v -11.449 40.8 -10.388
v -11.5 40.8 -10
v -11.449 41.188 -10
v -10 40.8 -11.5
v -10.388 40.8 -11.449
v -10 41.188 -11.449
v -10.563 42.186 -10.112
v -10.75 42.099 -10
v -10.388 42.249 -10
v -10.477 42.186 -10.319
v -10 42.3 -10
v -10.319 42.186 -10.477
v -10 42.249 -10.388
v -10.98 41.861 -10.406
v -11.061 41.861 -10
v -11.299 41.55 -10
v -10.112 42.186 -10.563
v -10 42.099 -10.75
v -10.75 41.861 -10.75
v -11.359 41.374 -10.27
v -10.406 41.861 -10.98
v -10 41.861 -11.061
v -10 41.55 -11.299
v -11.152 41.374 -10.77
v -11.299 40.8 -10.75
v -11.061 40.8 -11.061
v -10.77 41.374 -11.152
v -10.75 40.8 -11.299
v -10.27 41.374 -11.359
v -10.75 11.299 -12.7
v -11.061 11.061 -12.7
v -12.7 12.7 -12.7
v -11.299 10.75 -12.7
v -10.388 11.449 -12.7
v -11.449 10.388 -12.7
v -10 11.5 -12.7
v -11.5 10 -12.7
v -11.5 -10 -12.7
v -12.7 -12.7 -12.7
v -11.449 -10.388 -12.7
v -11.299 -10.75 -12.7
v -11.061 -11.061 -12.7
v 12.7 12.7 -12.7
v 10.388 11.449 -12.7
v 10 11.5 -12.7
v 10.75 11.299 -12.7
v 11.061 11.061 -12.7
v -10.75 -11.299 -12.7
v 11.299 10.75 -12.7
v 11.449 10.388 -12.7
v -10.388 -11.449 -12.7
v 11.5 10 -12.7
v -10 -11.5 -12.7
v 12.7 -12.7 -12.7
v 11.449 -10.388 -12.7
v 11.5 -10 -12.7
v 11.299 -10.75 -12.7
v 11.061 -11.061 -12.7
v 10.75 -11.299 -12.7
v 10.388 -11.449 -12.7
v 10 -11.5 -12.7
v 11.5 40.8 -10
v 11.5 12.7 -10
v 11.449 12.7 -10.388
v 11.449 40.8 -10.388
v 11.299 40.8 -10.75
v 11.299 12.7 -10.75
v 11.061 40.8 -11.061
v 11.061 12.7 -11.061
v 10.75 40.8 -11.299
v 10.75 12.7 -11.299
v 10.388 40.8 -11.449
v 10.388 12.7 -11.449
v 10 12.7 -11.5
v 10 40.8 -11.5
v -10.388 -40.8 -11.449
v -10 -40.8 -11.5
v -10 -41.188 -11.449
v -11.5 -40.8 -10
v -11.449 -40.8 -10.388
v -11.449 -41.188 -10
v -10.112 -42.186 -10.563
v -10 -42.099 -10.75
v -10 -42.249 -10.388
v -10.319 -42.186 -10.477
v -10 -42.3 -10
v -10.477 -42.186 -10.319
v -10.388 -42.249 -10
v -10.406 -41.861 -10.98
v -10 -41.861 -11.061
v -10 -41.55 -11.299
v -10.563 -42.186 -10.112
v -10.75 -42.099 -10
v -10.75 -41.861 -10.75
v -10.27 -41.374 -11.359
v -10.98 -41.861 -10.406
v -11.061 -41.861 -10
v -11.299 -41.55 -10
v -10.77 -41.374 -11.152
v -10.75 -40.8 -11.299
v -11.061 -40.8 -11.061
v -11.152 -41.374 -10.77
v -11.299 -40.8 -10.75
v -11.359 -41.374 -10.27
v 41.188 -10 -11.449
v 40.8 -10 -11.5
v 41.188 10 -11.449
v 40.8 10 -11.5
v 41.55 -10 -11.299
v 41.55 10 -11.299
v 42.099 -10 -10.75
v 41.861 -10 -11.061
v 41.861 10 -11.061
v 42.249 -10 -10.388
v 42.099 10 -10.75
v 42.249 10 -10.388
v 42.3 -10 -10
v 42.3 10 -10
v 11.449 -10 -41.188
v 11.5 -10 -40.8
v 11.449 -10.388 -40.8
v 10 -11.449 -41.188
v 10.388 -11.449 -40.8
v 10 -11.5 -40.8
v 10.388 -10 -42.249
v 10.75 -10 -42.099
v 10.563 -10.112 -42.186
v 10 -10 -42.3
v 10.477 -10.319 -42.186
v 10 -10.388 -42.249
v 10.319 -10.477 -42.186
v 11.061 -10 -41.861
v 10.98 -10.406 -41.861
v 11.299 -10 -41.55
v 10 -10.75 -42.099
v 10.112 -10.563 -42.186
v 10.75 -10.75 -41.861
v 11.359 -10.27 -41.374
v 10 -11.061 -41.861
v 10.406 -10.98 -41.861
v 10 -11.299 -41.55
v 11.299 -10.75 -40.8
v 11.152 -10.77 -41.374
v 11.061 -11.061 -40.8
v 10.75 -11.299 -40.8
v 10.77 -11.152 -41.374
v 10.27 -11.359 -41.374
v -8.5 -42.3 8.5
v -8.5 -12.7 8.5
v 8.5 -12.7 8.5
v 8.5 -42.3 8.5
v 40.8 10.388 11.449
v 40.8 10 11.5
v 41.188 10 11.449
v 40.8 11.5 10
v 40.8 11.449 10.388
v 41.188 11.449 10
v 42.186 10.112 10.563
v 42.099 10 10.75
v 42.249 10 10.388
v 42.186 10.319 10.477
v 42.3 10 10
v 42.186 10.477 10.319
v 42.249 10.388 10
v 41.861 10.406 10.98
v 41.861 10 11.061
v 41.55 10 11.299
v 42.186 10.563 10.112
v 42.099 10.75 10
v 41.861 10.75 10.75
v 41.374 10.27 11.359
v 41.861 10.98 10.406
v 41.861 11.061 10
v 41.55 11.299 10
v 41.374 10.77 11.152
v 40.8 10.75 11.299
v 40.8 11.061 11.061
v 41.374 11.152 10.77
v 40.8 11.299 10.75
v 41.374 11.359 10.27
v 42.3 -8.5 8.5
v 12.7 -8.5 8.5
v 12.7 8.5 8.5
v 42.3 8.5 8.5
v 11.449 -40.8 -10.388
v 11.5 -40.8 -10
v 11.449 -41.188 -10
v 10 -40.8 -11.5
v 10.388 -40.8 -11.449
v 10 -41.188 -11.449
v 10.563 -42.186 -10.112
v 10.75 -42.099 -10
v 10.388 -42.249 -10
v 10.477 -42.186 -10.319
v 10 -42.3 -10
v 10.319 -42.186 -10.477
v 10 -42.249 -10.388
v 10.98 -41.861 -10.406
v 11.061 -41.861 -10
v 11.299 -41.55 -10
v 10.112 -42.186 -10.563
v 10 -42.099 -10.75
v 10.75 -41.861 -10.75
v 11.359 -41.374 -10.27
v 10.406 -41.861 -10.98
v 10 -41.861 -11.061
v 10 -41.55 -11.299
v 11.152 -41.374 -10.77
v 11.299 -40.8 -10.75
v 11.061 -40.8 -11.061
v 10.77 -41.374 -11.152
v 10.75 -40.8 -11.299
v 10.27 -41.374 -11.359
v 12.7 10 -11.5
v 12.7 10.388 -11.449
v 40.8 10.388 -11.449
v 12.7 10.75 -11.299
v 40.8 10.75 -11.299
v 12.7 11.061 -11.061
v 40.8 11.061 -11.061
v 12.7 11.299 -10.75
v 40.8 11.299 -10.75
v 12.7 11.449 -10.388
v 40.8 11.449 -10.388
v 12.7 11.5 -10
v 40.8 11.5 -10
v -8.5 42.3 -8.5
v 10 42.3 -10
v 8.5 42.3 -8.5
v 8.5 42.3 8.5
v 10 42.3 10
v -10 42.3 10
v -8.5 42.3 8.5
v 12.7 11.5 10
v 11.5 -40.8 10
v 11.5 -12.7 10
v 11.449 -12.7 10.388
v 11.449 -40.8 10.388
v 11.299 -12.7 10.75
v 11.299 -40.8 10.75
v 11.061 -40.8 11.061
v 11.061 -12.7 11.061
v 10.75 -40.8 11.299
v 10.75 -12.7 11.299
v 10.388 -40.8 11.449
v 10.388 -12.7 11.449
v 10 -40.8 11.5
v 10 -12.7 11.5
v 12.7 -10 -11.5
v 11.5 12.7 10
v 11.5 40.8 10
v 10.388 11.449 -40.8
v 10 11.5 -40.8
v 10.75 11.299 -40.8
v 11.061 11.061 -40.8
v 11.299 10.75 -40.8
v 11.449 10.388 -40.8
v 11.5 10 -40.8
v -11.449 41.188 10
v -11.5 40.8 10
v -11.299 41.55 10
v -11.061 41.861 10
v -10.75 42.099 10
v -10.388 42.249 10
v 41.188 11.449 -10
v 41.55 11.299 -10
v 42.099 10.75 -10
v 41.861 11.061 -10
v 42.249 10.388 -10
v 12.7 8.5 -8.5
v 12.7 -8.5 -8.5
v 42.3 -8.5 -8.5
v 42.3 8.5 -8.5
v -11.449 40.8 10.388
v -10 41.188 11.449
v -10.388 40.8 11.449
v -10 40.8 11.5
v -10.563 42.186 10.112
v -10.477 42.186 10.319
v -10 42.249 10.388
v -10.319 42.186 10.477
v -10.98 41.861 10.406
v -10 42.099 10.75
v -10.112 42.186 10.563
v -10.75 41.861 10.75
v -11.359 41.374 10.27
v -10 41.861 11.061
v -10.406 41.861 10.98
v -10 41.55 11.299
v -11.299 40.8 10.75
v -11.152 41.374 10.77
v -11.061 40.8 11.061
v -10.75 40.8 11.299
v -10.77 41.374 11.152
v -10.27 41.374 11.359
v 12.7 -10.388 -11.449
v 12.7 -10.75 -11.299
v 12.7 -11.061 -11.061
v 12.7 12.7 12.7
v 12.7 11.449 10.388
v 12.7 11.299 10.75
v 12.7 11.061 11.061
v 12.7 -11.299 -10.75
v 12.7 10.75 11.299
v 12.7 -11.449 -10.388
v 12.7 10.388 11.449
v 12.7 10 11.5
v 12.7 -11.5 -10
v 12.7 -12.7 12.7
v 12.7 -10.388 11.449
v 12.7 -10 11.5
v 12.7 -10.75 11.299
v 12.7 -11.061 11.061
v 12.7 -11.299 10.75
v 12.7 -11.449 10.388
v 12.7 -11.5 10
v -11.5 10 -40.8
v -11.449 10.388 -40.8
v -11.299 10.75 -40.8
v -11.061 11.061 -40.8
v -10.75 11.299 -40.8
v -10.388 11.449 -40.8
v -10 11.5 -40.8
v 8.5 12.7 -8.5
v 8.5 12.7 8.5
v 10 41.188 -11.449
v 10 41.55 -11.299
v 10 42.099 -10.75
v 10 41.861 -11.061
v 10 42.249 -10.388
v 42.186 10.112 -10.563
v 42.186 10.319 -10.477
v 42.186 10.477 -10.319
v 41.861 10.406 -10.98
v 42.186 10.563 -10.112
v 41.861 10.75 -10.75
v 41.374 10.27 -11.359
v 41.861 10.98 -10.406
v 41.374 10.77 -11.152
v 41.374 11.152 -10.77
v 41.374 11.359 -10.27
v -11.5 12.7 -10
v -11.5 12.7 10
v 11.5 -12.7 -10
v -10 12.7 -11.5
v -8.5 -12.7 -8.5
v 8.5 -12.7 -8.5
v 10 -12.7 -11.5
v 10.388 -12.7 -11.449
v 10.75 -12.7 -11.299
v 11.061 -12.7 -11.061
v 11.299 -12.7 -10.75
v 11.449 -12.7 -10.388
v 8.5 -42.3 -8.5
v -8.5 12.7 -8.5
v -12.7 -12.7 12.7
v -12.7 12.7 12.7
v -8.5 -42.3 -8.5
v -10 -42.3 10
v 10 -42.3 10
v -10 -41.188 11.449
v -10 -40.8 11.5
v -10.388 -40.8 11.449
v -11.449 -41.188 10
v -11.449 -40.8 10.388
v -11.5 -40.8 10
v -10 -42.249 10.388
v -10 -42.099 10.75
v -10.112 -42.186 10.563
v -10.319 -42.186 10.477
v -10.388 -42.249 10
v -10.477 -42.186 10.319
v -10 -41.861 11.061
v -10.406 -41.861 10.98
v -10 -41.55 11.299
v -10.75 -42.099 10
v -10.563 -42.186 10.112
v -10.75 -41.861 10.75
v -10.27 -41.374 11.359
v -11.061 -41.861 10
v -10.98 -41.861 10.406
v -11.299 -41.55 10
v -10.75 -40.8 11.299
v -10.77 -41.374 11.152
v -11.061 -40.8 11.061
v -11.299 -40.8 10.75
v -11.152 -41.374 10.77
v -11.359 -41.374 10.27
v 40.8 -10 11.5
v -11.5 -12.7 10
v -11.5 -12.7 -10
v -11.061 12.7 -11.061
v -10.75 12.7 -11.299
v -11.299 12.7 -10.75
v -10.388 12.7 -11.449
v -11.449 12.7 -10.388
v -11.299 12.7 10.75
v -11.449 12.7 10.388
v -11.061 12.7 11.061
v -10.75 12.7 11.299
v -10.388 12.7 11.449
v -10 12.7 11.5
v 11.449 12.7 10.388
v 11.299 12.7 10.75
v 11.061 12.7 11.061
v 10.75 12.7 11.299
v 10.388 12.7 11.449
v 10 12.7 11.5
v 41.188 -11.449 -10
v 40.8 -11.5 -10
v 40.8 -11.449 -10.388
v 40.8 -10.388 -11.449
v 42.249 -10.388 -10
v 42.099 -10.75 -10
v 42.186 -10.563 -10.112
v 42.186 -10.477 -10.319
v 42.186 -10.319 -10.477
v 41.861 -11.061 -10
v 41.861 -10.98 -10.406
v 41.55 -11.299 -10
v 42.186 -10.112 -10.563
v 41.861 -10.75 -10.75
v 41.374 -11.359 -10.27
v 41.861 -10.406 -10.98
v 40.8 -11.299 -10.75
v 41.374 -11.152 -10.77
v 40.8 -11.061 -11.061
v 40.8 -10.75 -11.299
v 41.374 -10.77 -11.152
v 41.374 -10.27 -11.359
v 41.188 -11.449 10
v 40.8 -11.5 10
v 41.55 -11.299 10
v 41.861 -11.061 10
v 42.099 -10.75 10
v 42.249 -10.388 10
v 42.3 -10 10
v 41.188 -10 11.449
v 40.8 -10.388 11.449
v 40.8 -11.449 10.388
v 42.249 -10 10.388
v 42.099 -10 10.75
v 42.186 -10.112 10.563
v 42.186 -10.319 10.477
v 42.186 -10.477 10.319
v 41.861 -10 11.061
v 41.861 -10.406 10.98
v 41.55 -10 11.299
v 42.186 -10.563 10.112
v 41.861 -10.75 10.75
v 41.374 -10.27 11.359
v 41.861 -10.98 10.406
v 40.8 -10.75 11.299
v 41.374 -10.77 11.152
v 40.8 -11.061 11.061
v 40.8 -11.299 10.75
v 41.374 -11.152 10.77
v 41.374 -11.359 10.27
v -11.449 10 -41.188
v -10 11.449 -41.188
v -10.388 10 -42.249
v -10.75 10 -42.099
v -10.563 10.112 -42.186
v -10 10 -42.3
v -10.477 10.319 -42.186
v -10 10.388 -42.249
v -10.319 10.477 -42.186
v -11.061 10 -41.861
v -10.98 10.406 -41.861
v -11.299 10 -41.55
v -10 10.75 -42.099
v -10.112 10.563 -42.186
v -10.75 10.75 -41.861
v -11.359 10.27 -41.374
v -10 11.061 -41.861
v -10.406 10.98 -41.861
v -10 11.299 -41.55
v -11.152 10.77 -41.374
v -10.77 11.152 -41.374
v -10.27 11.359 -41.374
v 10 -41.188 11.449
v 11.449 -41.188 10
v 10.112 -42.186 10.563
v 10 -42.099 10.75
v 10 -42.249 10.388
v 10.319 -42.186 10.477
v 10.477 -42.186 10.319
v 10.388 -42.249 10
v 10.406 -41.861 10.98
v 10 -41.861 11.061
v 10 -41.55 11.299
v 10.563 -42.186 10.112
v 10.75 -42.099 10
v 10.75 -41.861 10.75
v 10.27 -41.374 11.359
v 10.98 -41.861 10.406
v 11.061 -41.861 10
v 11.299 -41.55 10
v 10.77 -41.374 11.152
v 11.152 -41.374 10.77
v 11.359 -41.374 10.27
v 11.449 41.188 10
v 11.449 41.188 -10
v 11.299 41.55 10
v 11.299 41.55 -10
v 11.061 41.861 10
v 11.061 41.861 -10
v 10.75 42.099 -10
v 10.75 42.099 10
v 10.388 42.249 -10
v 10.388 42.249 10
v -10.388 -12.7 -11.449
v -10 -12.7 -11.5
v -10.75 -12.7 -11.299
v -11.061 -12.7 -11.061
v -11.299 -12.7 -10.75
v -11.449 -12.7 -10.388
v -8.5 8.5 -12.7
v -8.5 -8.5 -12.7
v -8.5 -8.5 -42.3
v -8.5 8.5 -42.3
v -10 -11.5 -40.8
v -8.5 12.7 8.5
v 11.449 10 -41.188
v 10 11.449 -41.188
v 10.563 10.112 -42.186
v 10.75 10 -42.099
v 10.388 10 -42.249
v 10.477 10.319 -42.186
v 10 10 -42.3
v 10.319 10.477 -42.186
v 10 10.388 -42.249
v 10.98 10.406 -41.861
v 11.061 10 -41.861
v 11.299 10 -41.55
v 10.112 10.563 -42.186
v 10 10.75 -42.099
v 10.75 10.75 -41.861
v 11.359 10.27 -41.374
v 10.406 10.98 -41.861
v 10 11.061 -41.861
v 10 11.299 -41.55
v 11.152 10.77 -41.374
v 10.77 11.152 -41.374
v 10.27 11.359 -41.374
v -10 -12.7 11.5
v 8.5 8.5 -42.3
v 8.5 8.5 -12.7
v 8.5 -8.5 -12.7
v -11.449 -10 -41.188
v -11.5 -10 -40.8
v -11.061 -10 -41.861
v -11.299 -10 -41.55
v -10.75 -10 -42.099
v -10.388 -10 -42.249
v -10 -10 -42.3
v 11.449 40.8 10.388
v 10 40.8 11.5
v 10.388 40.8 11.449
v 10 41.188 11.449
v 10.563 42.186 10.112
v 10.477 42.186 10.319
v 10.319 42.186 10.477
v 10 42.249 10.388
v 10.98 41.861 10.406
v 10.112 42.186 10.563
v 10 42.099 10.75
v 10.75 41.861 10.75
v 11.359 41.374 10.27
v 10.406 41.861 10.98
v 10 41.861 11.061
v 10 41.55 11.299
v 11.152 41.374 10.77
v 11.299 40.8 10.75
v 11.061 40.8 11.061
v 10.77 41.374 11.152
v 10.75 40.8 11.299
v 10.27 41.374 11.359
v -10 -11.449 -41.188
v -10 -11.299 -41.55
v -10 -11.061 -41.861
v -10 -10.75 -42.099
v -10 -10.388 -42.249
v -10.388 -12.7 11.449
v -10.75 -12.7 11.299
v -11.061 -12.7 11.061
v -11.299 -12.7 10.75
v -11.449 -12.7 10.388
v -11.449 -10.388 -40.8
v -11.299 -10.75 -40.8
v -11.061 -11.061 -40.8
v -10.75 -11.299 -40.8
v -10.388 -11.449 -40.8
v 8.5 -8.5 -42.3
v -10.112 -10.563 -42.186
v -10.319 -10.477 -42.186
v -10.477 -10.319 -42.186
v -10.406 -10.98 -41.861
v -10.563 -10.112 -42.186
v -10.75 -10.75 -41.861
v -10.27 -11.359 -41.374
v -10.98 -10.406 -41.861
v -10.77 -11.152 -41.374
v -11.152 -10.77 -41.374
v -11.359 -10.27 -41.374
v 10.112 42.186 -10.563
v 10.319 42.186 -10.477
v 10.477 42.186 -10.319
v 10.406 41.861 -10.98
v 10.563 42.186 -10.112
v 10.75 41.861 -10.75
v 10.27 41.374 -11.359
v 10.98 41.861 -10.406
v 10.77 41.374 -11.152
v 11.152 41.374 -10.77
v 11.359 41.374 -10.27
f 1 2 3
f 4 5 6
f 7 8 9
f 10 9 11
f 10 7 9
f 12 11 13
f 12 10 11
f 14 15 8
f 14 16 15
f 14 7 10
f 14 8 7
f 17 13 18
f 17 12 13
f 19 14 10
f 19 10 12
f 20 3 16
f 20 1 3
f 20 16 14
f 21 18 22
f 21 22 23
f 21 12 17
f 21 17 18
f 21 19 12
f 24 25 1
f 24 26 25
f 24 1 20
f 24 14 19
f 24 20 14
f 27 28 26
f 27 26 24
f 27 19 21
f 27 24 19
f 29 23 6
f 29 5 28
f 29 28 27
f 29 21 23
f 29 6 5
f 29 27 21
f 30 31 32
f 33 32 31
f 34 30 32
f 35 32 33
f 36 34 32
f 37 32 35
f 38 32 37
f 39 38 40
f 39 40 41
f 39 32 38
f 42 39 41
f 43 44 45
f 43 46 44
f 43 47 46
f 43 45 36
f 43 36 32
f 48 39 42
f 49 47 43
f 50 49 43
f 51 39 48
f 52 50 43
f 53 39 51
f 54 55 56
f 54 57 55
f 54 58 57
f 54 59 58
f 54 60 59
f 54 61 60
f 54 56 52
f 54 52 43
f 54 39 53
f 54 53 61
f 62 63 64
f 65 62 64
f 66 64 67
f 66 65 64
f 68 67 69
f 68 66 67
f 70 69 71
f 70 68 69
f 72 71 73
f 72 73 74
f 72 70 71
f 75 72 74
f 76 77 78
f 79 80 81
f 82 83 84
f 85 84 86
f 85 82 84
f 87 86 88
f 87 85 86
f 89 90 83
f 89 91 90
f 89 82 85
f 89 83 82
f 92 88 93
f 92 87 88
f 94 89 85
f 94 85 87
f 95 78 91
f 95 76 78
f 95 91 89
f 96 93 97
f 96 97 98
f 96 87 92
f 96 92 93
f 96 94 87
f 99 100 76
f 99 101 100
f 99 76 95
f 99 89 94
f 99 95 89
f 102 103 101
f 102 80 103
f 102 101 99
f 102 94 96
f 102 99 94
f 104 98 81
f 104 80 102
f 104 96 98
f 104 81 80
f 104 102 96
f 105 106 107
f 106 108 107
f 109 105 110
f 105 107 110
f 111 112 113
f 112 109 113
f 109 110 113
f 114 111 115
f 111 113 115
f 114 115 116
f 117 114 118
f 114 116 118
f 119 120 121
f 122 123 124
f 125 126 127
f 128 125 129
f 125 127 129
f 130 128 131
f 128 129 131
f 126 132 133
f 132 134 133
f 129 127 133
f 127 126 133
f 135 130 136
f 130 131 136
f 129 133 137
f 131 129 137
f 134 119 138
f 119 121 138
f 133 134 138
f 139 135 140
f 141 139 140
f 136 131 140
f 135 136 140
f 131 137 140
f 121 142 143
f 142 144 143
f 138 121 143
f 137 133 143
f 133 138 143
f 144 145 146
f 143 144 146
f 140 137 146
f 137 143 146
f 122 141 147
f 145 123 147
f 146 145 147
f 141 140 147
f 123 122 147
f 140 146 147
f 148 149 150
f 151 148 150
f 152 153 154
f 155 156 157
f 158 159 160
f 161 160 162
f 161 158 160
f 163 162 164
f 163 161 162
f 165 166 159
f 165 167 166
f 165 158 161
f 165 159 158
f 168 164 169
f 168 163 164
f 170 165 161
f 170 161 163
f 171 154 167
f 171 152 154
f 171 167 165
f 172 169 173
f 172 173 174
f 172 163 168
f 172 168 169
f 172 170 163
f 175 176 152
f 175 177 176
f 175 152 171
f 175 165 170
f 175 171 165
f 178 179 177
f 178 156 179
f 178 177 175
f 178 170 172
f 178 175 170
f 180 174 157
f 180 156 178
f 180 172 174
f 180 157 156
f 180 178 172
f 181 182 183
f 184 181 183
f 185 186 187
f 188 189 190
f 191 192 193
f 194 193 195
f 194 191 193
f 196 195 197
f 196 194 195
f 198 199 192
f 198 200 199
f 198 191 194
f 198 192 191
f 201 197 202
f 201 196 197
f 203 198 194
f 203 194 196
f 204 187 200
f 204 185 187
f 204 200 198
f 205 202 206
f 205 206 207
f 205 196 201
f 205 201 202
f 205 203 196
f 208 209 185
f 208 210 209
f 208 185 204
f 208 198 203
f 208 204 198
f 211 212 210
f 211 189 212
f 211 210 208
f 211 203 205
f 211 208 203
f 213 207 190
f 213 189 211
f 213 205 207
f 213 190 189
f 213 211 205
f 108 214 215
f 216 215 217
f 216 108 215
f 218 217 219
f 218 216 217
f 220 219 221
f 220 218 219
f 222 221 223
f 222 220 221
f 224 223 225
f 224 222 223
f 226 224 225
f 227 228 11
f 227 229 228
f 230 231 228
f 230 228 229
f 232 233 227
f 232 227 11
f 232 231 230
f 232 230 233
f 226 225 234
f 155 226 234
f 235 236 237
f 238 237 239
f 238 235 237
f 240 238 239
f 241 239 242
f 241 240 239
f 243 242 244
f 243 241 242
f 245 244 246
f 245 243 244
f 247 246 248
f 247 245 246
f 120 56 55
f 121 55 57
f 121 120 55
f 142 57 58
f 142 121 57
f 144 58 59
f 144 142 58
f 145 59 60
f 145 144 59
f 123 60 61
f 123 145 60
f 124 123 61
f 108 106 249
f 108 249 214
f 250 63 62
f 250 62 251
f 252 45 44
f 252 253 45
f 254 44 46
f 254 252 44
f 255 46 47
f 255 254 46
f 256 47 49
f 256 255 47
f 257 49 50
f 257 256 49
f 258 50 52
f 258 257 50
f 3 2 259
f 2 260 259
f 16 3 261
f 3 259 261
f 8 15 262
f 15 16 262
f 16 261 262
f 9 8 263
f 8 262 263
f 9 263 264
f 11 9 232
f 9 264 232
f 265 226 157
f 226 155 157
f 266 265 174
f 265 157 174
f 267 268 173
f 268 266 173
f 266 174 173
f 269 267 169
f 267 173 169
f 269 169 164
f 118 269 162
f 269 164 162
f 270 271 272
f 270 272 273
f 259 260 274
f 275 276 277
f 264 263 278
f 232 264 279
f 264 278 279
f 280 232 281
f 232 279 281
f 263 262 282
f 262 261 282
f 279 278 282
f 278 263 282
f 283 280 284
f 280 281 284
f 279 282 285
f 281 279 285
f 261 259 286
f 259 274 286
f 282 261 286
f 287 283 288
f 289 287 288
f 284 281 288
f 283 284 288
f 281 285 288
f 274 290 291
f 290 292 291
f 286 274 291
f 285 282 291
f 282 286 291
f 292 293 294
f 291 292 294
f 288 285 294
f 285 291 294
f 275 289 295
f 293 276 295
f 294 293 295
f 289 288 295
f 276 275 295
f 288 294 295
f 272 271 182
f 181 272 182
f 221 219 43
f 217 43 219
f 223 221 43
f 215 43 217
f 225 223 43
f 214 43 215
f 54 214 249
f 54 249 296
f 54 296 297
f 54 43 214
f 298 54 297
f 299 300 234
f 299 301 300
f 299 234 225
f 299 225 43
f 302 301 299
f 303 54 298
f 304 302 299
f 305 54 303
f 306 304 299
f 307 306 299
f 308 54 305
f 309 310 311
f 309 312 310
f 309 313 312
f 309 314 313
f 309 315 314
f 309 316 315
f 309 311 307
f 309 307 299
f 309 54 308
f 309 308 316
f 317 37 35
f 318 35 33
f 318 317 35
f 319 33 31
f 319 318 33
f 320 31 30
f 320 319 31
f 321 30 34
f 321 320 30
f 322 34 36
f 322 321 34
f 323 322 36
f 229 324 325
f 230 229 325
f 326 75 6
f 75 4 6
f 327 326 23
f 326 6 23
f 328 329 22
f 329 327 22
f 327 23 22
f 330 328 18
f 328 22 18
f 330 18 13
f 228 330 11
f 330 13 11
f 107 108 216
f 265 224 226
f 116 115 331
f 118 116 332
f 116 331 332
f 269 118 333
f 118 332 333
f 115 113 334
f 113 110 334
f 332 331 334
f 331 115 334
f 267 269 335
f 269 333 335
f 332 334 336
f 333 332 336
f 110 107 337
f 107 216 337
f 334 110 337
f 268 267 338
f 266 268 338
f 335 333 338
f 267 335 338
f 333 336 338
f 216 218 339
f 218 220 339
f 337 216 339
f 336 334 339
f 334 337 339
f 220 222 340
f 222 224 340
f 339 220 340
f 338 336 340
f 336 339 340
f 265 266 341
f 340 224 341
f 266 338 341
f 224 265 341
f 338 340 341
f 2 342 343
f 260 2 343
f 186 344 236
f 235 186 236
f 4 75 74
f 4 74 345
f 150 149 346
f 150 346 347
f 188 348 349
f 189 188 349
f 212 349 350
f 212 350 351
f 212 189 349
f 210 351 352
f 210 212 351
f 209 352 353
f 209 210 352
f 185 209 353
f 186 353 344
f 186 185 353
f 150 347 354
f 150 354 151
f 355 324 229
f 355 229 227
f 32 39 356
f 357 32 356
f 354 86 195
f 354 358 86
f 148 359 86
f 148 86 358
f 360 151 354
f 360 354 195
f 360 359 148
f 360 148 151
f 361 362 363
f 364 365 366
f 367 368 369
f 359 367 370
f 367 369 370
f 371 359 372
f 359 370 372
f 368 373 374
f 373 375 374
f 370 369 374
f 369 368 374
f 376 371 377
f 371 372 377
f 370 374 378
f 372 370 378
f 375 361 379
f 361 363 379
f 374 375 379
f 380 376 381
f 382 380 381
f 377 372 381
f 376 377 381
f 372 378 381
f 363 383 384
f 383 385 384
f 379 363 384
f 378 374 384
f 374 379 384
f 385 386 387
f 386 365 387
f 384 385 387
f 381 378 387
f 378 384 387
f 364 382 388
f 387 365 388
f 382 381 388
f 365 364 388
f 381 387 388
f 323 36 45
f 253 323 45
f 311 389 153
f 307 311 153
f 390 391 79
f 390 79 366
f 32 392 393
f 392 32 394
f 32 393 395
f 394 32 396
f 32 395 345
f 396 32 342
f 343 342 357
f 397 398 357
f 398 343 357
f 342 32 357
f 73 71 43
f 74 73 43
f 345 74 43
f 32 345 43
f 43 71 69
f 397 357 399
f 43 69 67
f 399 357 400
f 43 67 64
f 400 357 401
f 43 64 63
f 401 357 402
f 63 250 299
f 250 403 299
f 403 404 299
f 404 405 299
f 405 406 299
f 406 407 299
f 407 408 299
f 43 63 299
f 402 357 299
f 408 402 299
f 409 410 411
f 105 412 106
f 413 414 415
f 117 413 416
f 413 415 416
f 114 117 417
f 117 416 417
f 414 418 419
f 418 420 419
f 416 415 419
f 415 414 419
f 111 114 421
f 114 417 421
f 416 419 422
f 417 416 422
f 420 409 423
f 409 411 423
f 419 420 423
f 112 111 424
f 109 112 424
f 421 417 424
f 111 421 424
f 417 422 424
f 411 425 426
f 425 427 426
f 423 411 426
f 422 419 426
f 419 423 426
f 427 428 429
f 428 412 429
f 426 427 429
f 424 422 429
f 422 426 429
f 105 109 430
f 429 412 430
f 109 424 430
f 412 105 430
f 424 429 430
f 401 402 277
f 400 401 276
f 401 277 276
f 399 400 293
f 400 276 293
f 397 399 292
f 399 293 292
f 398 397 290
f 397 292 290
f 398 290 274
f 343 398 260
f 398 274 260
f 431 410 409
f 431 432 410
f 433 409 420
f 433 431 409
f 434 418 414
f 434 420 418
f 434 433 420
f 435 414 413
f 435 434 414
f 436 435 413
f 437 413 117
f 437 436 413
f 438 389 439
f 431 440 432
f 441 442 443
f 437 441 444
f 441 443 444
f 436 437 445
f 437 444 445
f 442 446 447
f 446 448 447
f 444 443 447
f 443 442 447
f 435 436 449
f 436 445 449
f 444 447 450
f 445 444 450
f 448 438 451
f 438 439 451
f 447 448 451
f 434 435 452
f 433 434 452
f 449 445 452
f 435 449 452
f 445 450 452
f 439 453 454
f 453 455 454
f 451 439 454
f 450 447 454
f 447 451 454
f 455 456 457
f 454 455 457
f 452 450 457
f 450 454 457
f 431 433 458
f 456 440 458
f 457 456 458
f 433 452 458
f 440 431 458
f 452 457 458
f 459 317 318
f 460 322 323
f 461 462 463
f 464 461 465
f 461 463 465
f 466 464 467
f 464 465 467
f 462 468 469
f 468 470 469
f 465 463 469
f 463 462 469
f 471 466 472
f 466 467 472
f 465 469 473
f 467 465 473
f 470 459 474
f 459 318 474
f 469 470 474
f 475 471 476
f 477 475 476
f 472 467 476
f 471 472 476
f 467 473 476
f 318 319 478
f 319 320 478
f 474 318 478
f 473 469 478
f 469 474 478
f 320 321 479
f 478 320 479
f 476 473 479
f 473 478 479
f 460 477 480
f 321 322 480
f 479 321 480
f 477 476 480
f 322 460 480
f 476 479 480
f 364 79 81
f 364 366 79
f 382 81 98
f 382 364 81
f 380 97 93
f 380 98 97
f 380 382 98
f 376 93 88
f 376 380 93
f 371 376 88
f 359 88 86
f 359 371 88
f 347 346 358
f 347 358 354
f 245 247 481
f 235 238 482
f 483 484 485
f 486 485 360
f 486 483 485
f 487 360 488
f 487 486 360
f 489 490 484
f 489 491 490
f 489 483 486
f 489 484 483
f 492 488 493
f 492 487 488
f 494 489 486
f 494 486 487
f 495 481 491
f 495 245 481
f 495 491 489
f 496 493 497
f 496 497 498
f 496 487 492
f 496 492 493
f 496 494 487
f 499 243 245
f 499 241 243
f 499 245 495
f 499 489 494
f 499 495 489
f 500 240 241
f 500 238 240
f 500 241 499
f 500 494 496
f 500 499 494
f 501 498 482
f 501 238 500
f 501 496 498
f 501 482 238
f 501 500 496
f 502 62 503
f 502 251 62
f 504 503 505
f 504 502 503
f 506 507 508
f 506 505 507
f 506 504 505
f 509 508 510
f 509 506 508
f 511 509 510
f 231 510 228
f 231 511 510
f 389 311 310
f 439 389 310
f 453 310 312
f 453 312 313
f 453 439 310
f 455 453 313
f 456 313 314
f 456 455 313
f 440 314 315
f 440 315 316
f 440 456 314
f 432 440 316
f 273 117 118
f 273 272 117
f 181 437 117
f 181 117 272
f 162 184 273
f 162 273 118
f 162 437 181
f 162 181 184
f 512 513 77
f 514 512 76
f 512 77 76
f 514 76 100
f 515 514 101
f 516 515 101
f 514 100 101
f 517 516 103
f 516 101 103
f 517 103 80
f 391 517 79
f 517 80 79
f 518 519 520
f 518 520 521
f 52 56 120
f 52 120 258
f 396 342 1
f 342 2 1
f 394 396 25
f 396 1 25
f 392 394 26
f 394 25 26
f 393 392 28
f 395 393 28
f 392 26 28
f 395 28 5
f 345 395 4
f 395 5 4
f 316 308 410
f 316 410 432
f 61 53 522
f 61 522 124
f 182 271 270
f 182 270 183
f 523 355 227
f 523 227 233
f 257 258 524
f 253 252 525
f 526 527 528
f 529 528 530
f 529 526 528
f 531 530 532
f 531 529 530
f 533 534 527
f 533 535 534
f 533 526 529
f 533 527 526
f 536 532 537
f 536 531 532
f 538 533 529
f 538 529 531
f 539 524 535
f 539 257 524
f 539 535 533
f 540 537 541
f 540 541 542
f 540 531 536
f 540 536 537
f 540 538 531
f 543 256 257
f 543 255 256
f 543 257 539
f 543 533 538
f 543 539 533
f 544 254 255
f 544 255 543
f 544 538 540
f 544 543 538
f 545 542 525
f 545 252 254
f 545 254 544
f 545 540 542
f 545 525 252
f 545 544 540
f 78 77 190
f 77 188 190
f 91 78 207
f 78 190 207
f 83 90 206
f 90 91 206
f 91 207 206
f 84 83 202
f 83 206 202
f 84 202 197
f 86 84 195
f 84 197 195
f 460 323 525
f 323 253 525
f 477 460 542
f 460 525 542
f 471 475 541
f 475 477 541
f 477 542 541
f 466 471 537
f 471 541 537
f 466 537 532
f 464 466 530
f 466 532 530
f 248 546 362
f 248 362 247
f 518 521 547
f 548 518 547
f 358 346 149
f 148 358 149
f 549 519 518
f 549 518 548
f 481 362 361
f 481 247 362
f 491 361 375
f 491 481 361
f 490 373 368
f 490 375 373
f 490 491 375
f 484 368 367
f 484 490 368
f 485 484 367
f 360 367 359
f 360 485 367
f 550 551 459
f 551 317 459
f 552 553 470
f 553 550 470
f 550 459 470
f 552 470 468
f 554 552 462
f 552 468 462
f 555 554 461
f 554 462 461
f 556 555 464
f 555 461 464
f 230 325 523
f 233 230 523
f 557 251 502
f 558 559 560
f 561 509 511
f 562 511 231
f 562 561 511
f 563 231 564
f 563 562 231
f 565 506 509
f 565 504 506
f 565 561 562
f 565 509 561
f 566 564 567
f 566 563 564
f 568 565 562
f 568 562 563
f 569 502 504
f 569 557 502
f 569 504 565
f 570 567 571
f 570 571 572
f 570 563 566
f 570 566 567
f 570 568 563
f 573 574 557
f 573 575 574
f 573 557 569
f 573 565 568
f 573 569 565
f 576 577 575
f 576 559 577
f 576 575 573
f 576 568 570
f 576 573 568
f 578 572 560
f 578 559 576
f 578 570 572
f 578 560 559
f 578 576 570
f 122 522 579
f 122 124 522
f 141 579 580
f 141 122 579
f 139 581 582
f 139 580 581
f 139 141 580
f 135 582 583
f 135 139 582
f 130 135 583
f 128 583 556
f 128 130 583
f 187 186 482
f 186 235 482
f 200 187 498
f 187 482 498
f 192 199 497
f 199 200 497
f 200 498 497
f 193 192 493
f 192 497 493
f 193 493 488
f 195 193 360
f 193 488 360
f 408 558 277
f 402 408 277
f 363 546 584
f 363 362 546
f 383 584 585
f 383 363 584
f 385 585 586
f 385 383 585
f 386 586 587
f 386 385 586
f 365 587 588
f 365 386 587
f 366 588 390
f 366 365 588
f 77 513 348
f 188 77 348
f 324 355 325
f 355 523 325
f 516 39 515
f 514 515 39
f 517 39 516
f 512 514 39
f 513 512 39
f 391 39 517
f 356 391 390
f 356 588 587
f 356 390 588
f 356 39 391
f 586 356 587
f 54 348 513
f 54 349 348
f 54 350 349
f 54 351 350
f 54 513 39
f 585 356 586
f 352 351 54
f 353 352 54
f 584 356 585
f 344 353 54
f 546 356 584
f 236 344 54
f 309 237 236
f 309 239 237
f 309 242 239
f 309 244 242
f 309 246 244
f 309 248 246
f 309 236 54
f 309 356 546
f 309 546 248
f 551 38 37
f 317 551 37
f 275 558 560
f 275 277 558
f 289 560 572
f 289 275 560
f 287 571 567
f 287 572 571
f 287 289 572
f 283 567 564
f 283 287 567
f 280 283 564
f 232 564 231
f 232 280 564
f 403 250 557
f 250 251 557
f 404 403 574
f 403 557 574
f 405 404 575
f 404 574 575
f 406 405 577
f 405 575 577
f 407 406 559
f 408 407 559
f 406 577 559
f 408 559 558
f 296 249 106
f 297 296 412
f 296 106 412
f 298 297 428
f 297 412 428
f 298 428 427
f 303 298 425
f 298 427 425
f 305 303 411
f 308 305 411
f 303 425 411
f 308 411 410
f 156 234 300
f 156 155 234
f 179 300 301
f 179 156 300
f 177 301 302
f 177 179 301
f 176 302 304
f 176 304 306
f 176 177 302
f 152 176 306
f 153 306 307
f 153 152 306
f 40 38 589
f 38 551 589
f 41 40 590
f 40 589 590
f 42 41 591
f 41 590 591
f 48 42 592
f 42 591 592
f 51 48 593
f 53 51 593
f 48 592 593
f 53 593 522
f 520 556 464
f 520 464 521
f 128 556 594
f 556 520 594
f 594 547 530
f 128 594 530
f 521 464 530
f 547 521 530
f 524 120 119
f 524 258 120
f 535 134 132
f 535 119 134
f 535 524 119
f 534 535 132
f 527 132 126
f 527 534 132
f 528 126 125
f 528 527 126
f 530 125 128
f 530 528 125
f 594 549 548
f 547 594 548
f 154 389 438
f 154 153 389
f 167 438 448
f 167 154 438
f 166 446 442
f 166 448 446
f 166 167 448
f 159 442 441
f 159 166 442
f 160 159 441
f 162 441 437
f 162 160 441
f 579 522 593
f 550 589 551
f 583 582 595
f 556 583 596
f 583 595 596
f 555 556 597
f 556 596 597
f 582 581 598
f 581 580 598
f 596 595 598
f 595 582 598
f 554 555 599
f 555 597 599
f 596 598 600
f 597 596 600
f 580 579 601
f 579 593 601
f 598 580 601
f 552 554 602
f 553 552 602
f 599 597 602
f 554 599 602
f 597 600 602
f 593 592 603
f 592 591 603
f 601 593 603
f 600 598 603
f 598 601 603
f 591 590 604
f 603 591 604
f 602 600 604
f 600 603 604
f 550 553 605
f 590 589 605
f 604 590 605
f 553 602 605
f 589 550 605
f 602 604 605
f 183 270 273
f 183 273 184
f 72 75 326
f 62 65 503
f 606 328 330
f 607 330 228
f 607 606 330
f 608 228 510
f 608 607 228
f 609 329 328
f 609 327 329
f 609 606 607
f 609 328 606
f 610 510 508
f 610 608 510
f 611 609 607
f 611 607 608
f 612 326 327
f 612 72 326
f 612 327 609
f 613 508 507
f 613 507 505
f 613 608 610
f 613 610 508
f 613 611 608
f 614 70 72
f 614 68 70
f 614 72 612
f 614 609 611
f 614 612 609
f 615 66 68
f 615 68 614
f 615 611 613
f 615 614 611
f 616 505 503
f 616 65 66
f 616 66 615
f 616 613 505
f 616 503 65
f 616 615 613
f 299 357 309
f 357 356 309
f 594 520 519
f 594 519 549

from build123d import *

# Parameters (mm, degrees)
F0_W            = 25.4
F0_H            = 25.4
F1_DEPTH        = 12.7
F2_W            = 23
F2_H            = 23
F2_W_2          = 17
F2_H_2          = 17
F3_DEPTH        = 29.6
F3_COPIES_COUNT = 3
F3_COPIES_ANGLE = 180
F4_R            = 1.5


# Not quite as in the source:
# - a pattern or mirror of a feature is missing from the dataset's text; its kind, count and spacing are read off the source's solid


with BuildPart() as f1:
    # F0 (on Front) → F1 (new body, symmetric)
    with BuildSketch(Plane.XZ):
        Rectangle(F0_W, F0_H)
    extrude(amount=F1_DEPTH, both=True)

    # F2 (on face) → F3 (join)
    with BuildSketch(Plane.XZ.offset(12.7)):
        Rectangle(F2_W, F2_H)
        Rectangle(F2_W_2, F2_H_2, mode=Mode.SUBTRACT)
    f3 = extrude(amount=F3_DEPTH)

    # F3_copies: F3 ×3 about axis
    f3_copies_axis = Axis((0, 0, 0), (0, 0, 1))
    for i in range(1, F3_COPIES_COUNT):
        add(f3.rotate(f3_copies_axis, i * F3_COPIES_ANGLE / (F3_COPIES_COUNT - 1)))

    # F3_copies1: F3 across plane
    add(f3.mirror(Plane(origin=(0, 0, 0), x_dir=(0, -0.7071067812, -0.7071067812), z_dir=(0, 0.7071067812, -0.7071067812))))

    # F4
    f4_edges = [f1.edges().sort_by_distance(p)[0] for p in [
        (11.5, -27.5, 11.5),
        (11.5, -27.5, -11.5),
        (-11.5, -27.5, 11.5),
        (-11.5, -27.5, -11.5),
        (0, -42.3, 11.5),
        (11.5, -42.3, 0),
        (0, -42.3, -11.5),
        (-11.5, -42.3, 0),
        (-11.5, 27.5, -11.5),
        (-11.5, 27.5, 11.5),
        (-11.5, 42.3, 0),
        (11.5, 27.5, -11.5),
        (0, 42.3, -11.5),
        (11.5, 27.5, 11.5),
        (11.5, 42.3, 0),
        (0, 42.3, 11.5),
        (27.5, 11.5, 11.5),
        (27.5, -11.5, 11.5),
        (42.3, 0, 11.5),
        (27.5, -11.5, -11.5),
        (42.3, -11.5, 0),
        (27.5, 11.5, -11.5),
        (42.3, 0, -11.5),
        (42.3, 11.5, 0),
        (11.5, -11.5, -27.5),
        (11.5, 11.5, -27.5),
        (11.5, 0, -42.3),
        (-11.5, -11.5, -27.5),
        (0, -11.5, -42.3),
        (-11.5, 11.5, -27.5),
        (-11.5, 0, -42.3),
        (0, 11.5, -42.3),
    ]]
    fillet(f4_edges, radius=F4_R)


solid = f1.part
